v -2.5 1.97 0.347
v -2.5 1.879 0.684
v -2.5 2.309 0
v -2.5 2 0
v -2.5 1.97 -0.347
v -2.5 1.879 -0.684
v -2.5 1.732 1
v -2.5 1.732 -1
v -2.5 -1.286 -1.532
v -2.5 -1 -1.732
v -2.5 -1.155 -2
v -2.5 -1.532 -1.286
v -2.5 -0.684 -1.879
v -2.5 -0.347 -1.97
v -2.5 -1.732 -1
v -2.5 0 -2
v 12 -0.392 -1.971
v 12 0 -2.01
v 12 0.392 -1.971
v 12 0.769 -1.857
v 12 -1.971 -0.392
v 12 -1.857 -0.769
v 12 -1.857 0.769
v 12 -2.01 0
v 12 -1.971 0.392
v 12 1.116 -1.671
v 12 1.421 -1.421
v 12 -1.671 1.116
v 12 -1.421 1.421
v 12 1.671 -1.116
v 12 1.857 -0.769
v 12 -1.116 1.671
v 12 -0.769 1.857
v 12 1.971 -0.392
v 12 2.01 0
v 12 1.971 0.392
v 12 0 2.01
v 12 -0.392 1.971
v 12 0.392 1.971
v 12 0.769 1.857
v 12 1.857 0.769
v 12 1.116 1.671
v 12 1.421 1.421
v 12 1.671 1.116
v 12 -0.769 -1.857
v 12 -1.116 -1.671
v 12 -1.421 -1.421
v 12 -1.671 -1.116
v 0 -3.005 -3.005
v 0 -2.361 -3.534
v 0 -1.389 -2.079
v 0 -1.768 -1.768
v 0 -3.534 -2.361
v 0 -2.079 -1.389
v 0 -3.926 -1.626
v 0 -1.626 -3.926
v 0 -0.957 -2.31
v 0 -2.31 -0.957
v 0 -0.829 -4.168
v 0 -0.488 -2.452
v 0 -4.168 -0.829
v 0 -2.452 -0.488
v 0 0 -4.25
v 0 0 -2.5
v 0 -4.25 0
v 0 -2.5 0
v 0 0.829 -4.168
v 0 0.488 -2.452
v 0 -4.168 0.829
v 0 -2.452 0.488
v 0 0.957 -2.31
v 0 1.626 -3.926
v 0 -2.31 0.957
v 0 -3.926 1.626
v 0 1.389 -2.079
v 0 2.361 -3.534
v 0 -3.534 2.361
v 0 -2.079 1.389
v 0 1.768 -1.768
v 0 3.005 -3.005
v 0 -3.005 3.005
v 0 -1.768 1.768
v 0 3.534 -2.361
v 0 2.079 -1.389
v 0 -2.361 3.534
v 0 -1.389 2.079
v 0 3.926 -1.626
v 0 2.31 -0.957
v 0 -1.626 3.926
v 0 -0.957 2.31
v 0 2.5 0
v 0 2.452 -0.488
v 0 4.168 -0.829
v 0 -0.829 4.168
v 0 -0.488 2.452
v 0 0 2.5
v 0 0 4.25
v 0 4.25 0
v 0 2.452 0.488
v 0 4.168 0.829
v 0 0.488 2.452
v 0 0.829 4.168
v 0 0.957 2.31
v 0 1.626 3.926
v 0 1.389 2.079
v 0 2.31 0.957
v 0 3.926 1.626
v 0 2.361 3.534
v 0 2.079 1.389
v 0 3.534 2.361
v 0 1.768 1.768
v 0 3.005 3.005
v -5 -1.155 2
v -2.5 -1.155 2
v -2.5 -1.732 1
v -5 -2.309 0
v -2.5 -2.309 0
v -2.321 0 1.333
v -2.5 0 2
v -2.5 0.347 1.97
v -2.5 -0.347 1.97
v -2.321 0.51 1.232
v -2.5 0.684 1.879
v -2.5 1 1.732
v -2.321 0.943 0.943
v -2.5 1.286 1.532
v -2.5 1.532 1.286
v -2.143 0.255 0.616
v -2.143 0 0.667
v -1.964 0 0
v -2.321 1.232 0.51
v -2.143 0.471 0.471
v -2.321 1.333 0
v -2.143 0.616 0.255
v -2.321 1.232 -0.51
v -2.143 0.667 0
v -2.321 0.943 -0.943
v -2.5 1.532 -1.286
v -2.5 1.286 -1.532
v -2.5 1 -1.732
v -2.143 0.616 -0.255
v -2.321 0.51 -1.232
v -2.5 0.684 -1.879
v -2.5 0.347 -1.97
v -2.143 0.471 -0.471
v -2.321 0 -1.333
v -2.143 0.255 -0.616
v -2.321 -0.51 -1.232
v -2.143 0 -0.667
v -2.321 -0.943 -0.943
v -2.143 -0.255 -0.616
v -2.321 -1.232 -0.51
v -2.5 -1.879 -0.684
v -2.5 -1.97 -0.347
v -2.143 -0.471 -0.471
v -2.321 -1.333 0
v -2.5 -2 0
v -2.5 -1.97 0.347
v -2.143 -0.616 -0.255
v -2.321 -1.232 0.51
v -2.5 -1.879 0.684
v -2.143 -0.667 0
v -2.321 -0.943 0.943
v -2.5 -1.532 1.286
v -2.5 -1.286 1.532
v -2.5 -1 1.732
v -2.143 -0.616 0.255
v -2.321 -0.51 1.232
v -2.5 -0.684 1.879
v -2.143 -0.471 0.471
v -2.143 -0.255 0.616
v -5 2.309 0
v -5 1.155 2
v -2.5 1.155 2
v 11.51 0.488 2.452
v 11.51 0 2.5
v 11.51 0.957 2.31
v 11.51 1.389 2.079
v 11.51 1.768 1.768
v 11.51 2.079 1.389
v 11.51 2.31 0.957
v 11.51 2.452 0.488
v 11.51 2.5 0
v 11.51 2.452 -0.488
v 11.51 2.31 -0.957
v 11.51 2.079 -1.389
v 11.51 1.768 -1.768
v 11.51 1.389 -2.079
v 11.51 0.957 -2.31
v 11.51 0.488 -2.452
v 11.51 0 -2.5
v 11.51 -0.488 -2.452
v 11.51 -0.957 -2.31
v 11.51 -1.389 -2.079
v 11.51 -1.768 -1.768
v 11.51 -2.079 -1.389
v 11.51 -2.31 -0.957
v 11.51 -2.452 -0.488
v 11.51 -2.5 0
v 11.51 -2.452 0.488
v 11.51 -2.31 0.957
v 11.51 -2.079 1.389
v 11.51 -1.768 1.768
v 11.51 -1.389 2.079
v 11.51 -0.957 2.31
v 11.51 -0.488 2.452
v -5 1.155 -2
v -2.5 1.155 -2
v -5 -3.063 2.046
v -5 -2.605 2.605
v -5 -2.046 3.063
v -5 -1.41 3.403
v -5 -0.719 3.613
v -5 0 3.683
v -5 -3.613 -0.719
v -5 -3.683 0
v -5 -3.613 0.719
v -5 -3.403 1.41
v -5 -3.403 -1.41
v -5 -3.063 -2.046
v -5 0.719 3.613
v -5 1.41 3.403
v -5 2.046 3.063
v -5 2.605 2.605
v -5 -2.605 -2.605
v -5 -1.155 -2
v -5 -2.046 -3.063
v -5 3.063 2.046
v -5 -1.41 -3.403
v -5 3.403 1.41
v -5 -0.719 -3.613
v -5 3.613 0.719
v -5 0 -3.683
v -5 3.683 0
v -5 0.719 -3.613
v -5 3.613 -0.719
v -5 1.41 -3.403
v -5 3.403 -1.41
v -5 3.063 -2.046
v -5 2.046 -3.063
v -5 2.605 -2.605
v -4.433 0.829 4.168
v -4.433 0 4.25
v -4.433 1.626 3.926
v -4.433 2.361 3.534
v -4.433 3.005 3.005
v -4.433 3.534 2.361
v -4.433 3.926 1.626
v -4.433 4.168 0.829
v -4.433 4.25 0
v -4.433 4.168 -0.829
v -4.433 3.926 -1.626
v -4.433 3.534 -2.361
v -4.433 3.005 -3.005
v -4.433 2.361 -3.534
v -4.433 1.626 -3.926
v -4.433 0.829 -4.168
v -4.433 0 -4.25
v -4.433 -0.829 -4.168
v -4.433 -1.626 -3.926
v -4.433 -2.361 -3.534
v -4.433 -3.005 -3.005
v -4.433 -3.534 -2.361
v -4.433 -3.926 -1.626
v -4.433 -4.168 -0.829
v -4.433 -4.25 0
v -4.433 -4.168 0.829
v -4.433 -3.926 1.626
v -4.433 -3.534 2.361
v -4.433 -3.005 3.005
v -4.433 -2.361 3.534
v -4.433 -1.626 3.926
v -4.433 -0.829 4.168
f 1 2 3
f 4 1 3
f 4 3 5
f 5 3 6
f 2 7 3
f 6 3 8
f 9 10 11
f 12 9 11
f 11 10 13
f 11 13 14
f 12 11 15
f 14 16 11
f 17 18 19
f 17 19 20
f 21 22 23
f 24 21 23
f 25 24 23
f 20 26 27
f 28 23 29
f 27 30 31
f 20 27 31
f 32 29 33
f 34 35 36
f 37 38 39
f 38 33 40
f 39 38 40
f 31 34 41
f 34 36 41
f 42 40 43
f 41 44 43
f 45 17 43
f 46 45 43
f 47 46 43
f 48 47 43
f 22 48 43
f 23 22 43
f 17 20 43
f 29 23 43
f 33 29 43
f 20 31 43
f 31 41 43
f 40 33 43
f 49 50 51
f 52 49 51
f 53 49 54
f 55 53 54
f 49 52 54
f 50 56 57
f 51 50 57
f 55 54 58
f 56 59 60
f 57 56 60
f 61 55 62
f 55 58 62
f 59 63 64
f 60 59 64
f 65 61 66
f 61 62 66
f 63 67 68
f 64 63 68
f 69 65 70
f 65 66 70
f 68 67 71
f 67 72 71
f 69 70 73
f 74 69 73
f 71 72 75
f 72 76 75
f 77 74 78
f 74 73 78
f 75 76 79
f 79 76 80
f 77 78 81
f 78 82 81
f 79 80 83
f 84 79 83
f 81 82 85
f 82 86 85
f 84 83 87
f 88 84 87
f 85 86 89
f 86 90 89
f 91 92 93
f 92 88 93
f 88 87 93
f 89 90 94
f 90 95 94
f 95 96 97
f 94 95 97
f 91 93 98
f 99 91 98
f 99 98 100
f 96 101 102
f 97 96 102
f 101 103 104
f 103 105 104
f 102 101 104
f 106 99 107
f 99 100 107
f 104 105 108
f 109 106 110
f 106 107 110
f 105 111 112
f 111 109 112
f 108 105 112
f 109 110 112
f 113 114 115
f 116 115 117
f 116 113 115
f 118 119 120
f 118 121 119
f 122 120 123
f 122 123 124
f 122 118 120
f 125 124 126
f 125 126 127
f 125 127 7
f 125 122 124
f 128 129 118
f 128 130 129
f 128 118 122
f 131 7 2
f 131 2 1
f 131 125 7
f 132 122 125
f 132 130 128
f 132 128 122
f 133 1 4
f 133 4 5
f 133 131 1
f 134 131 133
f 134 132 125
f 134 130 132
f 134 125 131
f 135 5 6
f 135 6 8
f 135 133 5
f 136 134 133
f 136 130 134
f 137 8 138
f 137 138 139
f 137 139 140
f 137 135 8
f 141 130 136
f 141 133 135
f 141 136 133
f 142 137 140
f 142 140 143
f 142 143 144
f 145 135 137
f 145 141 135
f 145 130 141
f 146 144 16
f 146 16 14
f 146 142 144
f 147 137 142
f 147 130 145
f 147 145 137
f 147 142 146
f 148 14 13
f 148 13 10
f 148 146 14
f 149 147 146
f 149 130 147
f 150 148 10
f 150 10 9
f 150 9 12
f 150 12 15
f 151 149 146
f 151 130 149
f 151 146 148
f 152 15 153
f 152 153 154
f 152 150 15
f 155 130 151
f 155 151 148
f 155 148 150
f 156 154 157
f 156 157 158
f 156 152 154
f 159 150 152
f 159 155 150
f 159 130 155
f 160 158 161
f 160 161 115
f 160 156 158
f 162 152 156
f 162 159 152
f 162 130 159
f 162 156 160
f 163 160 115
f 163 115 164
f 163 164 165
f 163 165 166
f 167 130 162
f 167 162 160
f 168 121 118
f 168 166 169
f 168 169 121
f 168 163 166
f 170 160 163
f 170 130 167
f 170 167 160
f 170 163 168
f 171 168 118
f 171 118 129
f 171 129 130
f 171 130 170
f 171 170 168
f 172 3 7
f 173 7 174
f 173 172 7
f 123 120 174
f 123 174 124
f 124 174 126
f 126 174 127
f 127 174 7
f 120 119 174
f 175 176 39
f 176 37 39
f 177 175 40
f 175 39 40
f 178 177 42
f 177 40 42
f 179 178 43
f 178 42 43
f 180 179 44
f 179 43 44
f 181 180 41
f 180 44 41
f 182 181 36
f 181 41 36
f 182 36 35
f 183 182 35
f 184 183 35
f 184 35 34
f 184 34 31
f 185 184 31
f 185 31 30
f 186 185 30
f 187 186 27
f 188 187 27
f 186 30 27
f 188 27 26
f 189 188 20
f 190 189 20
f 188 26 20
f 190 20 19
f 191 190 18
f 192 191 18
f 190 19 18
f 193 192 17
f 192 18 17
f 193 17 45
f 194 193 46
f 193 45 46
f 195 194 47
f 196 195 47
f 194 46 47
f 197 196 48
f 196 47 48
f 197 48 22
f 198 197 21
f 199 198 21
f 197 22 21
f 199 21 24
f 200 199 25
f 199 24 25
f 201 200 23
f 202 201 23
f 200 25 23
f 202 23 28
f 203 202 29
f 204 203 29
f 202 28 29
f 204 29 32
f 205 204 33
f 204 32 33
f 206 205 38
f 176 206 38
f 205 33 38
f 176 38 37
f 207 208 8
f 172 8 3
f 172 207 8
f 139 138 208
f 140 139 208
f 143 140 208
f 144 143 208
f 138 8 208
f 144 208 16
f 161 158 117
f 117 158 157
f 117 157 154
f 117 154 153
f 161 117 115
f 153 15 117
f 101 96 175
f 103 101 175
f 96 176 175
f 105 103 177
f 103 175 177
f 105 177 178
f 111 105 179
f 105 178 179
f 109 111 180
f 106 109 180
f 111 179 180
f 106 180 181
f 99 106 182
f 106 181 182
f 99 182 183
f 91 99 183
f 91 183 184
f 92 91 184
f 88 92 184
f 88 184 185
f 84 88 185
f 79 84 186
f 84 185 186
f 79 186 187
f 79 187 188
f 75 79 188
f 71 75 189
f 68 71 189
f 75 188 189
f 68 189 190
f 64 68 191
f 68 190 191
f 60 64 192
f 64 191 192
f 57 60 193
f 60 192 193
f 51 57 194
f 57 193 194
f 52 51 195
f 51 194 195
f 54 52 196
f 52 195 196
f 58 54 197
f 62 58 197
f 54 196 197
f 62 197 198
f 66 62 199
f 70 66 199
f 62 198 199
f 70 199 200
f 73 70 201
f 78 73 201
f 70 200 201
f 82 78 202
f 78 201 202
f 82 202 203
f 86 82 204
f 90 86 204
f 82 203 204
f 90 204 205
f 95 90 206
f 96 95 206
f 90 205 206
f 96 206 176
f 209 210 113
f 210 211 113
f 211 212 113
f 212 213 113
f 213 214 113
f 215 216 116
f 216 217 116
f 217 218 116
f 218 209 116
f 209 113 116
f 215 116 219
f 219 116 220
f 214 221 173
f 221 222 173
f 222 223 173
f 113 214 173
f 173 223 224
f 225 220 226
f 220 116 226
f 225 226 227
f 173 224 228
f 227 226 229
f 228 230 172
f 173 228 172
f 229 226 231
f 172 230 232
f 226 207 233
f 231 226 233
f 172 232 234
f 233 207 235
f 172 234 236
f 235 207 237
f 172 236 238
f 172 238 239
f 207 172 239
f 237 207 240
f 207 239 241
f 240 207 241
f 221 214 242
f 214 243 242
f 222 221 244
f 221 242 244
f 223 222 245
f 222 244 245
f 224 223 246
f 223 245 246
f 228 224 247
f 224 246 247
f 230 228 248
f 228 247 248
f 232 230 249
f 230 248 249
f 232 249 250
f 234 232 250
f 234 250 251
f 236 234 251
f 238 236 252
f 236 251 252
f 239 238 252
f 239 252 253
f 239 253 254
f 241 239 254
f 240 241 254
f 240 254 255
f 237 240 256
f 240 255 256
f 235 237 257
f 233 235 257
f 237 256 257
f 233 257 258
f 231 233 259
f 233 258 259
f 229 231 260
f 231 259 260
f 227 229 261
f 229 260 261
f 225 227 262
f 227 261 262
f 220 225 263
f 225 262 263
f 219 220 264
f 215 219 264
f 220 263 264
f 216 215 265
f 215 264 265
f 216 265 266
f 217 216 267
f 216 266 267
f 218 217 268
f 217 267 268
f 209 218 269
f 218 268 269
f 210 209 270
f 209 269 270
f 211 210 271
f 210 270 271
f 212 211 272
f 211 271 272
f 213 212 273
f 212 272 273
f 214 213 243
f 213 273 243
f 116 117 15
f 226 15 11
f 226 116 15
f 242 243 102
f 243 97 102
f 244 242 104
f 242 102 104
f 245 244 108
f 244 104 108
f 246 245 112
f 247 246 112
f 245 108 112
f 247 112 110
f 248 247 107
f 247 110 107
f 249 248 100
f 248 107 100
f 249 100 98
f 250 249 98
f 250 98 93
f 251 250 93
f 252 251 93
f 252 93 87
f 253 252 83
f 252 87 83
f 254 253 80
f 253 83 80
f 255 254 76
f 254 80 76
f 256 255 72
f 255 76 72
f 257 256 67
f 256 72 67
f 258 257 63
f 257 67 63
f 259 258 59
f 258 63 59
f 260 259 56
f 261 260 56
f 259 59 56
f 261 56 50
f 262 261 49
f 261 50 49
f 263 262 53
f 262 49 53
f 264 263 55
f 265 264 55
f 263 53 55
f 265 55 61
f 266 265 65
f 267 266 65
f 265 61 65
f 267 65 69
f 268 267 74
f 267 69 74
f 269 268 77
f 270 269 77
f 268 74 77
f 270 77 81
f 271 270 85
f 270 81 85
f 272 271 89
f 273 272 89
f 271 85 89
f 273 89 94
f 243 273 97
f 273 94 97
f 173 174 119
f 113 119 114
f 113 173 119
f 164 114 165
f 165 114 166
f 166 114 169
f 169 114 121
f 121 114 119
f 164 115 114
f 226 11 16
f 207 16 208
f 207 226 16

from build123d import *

# Parameters (mm, degrees)
CUT_EXTRUDE_1_DEPTH = 2.5


with BuildPart() as part:
    # 草圖1 → 旋轉1 (revolve)
    with BuildSketch(Plane.XY, mode=Mode.PRIVATE) as revolve_1_sk:
        Polygon((-5, 0), (-5, 3.683333333), (-4.433333333, 4.25), (0, 4.25), (0, 2.5), (11.5095, 2.5), (12, 2.0095), (12, 0), align=None)
    revolve(revolve_1_sk.sketch.rotate(Axis((12, 0, 0), (-1, 0, 0)), 270), axis=Axis((12, 0, 0), (-1, 0, 0)))

    # 草圖2 → 除料-旋轉1 (revolve, cut)
    with BuildSketch(Plane.XY, mode=Mode.PRIVATE) as cut_revolve_1_sk:
        Polygon((-5, 0), (-5, 2), (-2.5, 2), (-1.964101615, 0), align=None)
    revolve(cut_revolve_1_sk.sketch.rotate(Axis((-1.964101615, 0, 0), (-1, 0, 0)), 270), axis=Axis((-1.964101615, 0, 0), (-1, 0, 0)), mode=Mode.SUBTRACT)

    # 草圖3 → 除料-伸長1 (cut)
    with BuildSketch(Plane(origin=(-5, 0, 0), x_dir=(0, 0, -1), z_dir=(1, 0, 0))):
        Polygon((-2, 1.154700538), (-2, -1.154700538), (0, -2.309401077), (2, -1.154700538), (2, 1.154700538), (0, 2.309401077), align=None)
    extrude(amount=CUT_EXTRUDE_1_DEPTH, mode=Mode.SUBTRACT)


solid = part.part
